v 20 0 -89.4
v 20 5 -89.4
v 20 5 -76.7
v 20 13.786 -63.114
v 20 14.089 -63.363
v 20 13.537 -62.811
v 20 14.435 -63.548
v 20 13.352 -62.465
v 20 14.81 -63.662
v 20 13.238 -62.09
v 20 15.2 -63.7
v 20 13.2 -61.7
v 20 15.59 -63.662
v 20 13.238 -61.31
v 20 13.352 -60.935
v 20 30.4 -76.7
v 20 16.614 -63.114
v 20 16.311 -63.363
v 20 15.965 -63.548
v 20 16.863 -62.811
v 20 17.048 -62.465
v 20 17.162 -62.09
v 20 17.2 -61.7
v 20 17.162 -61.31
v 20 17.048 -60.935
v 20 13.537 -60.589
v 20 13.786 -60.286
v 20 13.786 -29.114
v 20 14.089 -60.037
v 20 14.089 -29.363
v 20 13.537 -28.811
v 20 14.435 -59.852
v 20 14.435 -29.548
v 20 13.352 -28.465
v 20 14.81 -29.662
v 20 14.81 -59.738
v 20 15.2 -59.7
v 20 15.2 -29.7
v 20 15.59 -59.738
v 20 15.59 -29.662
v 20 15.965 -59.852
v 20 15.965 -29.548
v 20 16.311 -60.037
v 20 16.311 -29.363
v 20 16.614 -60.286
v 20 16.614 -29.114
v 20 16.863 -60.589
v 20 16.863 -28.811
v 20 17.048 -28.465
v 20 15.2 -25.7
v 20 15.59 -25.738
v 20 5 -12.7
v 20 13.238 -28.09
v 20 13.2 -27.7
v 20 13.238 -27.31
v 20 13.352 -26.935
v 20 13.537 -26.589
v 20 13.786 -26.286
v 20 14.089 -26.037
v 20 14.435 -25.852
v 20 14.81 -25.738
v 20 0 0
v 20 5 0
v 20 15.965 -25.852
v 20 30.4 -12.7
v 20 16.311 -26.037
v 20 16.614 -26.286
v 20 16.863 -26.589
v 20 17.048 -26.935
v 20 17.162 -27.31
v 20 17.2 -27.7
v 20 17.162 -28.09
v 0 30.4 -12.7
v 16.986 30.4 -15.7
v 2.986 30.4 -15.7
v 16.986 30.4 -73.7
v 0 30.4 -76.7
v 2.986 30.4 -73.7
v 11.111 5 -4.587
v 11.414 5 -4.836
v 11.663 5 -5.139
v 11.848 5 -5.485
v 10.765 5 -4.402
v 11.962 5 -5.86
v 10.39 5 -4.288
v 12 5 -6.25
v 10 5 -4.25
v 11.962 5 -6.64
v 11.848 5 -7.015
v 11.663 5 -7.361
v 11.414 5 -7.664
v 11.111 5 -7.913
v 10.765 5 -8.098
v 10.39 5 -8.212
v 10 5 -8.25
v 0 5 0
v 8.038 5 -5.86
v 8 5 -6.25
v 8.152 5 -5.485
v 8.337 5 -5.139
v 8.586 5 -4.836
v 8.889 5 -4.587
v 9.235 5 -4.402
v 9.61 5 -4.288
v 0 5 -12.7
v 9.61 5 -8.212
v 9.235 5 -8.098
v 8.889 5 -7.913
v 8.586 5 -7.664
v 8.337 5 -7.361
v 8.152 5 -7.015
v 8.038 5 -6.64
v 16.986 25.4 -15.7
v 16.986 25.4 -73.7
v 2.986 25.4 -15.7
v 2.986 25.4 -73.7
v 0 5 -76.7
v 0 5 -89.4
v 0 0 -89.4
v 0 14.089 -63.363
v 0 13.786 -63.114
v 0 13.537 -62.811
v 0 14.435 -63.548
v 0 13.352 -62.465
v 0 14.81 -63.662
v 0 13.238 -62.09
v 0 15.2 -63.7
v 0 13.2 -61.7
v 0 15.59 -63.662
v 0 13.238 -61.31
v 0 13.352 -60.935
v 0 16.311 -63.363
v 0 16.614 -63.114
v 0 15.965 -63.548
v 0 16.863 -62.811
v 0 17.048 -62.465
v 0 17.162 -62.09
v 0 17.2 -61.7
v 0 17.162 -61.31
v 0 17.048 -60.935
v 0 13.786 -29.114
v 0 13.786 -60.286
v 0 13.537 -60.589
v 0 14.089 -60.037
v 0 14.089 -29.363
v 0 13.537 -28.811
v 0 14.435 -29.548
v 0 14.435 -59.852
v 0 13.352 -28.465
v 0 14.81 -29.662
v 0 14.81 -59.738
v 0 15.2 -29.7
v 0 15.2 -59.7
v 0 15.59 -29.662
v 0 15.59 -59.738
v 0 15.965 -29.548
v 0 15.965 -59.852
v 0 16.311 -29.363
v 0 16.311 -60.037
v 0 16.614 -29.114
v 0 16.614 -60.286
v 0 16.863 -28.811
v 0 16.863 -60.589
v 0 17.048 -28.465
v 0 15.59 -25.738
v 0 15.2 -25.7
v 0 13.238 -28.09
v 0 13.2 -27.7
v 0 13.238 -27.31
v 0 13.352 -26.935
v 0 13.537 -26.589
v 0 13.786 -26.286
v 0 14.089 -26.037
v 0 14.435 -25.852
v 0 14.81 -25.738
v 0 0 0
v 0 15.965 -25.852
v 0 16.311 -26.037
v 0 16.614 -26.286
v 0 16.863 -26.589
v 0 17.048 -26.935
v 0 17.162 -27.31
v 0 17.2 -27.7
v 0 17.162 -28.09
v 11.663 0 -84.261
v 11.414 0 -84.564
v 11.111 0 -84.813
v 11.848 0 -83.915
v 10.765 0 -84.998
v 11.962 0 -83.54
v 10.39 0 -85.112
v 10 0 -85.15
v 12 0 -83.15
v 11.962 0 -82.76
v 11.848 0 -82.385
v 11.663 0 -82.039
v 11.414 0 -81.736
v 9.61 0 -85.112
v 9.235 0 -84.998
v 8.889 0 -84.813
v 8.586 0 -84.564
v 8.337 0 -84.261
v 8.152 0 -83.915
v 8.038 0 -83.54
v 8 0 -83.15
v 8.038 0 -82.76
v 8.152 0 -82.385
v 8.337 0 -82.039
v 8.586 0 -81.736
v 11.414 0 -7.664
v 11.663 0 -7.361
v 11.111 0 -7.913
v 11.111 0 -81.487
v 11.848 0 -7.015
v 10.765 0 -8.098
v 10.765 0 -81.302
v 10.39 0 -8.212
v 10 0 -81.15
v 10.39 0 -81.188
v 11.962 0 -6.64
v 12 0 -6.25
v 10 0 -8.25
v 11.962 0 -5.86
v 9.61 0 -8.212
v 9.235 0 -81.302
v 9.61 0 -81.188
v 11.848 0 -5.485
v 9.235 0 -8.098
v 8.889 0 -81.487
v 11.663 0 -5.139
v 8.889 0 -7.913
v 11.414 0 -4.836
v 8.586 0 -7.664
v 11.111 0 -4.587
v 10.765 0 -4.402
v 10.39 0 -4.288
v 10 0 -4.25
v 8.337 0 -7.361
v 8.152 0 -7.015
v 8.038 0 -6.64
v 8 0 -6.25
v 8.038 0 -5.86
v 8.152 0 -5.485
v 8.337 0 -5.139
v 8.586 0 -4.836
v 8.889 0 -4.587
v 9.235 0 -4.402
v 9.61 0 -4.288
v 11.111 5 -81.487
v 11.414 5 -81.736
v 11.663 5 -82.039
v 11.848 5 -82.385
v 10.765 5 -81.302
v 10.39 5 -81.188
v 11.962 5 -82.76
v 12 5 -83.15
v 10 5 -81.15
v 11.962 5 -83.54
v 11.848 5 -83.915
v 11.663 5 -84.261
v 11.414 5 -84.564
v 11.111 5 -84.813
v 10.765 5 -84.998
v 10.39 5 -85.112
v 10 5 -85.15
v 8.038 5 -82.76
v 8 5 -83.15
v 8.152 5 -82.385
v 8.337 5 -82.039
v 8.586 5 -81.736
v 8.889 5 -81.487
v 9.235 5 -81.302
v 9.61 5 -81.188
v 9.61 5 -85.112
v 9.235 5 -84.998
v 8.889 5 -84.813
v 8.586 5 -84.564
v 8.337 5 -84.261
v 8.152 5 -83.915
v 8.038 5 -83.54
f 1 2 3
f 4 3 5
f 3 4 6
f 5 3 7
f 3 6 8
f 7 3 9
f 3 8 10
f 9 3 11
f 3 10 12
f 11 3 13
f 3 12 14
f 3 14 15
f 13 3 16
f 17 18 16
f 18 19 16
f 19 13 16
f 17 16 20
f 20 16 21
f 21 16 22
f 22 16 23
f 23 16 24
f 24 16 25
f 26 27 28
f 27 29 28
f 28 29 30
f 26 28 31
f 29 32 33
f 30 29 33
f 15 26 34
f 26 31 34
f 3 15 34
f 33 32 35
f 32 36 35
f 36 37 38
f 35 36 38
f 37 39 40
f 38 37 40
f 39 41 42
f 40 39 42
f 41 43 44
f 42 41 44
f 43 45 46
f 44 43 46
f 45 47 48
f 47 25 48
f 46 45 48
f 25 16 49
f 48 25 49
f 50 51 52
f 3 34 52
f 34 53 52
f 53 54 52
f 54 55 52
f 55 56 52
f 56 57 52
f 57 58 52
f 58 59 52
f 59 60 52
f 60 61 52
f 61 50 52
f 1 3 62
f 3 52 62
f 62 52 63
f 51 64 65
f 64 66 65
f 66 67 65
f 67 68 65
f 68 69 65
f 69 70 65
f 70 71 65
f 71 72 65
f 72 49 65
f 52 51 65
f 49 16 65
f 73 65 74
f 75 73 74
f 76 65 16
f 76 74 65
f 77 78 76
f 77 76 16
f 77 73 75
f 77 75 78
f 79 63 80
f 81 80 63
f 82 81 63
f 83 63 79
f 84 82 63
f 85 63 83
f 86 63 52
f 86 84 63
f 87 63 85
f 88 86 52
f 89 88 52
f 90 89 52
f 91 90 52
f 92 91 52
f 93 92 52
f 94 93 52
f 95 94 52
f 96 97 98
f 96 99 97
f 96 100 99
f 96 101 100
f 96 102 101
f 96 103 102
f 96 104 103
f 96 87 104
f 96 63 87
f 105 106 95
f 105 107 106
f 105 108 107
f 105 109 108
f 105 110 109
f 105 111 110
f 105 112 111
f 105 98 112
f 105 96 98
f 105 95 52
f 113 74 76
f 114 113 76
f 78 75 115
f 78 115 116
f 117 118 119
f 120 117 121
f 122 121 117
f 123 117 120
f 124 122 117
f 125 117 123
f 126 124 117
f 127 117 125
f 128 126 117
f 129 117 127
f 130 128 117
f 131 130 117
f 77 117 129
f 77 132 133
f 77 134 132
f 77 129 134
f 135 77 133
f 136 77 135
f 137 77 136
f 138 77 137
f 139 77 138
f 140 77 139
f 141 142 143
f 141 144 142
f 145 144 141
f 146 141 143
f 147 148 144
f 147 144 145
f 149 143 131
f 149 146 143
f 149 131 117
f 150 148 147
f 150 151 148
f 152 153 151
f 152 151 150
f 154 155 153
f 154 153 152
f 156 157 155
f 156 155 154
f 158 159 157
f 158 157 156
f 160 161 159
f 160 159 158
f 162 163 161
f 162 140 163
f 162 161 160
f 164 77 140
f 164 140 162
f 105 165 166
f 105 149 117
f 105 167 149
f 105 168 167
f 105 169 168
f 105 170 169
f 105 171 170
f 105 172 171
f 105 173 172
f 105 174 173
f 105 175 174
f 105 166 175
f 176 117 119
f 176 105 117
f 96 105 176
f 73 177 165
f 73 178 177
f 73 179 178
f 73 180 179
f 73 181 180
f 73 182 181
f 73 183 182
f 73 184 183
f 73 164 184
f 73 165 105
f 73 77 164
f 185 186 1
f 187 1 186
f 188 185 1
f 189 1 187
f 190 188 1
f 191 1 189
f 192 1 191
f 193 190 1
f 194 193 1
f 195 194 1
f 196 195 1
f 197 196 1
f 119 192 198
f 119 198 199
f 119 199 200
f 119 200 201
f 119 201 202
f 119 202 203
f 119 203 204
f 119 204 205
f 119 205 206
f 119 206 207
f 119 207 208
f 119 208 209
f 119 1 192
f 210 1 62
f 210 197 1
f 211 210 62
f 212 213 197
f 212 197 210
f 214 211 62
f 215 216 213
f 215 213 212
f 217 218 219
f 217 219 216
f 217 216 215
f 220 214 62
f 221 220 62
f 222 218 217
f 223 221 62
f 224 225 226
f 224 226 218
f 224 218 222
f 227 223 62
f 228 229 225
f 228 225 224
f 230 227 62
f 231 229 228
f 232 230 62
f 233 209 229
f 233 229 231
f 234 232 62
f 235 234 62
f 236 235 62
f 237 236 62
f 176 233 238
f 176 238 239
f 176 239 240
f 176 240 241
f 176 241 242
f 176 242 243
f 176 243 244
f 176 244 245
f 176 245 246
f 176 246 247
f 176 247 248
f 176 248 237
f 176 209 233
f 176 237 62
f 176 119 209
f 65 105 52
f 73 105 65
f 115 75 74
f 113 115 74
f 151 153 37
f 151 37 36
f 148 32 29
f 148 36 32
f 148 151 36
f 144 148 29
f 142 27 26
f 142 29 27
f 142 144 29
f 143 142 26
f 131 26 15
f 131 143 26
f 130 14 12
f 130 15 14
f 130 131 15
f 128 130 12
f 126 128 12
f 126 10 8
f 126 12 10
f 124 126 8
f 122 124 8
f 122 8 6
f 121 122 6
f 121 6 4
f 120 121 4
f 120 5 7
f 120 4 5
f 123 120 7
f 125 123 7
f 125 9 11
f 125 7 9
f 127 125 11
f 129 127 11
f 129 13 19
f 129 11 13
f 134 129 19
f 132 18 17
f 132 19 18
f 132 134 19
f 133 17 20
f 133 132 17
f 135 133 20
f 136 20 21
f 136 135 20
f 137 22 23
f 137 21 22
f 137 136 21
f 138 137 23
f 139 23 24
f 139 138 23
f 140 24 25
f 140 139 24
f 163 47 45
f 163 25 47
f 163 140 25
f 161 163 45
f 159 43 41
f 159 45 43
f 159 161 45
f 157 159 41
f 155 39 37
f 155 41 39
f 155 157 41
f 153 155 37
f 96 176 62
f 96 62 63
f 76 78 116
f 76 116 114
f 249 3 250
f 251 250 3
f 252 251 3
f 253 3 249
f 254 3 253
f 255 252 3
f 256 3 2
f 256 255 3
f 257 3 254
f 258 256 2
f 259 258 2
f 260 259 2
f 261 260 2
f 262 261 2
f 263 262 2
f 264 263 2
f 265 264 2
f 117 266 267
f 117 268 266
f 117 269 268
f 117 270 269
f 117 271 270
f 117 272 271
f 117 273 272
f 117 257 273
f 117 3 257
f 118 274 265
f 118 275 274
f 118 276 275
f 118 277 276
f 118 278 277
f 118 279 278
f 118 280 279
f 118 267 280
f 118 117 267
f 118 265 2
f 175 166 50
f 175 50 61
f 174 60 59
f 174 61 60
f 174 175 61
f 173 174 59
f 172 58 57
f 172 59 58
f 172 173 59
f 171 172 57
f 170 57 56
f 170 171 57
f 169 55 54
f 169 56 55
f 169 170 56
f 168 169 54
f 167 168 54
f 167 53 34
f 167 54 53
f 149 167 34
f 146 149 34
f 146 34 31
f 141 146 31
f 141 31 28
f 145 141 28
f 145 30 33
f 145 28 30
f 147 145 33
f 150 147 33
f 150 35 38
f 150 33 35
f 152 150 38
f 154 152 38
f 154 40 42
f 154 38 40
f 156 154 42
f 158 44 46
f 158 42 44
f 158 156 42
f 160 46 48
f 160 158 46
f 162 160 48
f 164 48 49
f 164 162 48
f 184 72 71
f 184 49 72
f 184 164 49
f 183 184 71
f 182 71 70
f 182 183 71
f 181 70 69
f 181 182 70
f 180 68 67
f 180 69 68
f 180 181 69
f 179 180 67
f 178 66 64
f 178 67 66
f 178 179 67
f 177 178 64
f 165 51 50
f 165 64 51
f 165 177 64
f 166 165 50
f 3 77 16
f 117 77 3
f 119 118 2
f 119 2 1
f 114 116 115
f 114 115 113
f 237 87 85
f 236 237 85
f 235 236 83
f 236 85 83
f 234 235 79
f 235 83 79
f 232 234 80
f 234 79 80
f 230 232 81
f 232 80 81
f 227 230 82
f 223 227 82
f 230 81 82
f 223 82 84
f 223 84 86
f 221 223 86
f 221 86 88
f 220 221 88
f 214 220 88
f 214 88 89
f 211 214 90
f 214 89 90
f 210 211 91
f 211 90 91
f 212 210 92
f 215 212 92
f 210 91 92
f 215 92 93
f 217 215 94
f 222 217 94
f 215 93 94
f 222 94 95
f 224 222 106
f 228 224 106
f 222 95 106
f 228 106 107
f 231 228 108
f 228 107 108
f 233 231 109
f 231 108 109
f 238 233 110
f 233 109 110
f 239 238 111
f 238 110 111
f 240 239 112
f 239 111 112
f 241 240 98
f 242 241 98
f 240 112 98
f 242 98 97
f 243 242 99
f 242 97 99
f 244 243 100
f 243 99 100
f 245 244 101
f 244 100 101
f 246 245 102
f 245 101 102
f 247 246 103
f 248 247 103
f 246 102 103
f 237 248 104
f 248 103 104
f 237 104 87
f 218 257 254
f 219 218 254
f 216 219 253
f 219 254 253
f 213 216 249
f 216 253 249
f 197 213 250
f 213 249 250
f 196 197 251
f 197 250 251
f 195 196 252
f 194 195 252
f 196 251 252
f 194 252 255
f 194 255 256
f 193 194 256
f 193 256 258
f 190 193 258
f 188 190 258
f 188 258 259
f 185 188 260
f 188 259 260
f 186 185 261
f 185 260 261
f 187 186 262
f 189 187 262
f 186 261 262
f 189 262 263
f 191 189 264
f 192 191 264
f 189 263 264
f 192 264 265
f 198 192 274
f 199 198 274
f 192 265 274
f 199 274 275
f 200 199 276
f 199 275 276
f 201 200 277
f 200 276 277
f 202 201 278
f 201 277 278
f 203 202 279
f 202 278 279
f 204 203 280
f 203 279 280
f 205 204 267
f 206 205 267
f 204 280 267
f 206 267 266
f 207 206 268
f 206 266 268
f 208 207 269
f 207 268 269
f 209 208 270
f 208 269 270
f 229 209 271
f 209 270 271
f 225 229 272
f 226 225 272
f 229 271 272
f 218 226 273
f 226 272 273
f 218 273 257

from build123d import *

# Parameters (mm, degrees)
BOSS_EXTRUDE1_DEPTH     = 20
SKETCH4_W               = 14
SKETCH4_H               = 58
CUT_EXTRUDE1_DEPTH      = 5
SKETCH5_R               = 2
CUT_EXTRUDE2_DEPTH      = 5
CUT_EXTRUDE3_DEPTH      = 97.522121817
CUT_EXTRUDE3_DEPTH_BACK = 5
SKETCH6_R               = 2


with BuildPart() as part:
    # Sketch1 → Boss-Extrude1 (new body)
    with BuildSketch(Plane(origin=(0, 0, 0), x_dir=(0, 0, -1), z_dir=(1, 0, 0))):
        Polygon((0, 0), (0, 5), (12.7, 5), (12.7, 30.4), (76.7, 30.4), (76.7, 5), (89.4, 5), (89.4, 0), align=None)
    extrude(amount=BOSS_EXTRUDE1_DEPTH)

    # Sketch4 → Cut-Extrude1 (cut)
    with BuildSketch(Plane(origin=(0, 30.4, 0), x_dir=(1, 0, 0), z_dir=(0, 1, 0))):
        with Locations((9.986416009, 44.7)):
            Rectangle(SKETCH4_W, SKETCH4_H)
    extrude(amount=-CUT_EXTRUDE1_DEPTH, mode=Mode.SUBTRACT)

    # Sketch5 → Cut-Extrude2 (cut)
    with BuildSketch(Plane(origin=(0, 5, 0), x_dir=(1, 0, 0), z_dir=(0, 1, 0))):
        with Locations(Location((10, 83.15, 0), (0, 0, 270))):
            Circle(SKETCH5_R)
        with Locations(Location((10, 6.25, 0), (0, 0, 270))):
            Circle(SKETCH5_R)
    extrude(amount=-CUT_EXTRUDE2_DEPTH, mode=Mode.SUBTRACT)

    # Sketch6 → Cut-Extrude3 (cut, two sides: drawn at the far end of the back side and taken through both)
    with BuildSketch(Plane(origin=(0, 0, 0), x_dir=(0, 0, -1), z_dir=(1, 0, 0)).offset(-CUT_EXTRUDE3_DEPTH_BACK)):
        with Locations(Location((27.7, 15.2, 0), (0, 0, 180))):
            Circle(SKETCH6_R)
        with Locations(Location((61.7, 15.2, 0), (0, 0, 180))):
            Circle(SKETCH6_R)
    extrude(amount=CUT_EXTRUDE3_DEPTH + CUT_EXTRUDE3_DEPTH_BACK, mode=Mode.SUBTRACT)


solid = part.part
